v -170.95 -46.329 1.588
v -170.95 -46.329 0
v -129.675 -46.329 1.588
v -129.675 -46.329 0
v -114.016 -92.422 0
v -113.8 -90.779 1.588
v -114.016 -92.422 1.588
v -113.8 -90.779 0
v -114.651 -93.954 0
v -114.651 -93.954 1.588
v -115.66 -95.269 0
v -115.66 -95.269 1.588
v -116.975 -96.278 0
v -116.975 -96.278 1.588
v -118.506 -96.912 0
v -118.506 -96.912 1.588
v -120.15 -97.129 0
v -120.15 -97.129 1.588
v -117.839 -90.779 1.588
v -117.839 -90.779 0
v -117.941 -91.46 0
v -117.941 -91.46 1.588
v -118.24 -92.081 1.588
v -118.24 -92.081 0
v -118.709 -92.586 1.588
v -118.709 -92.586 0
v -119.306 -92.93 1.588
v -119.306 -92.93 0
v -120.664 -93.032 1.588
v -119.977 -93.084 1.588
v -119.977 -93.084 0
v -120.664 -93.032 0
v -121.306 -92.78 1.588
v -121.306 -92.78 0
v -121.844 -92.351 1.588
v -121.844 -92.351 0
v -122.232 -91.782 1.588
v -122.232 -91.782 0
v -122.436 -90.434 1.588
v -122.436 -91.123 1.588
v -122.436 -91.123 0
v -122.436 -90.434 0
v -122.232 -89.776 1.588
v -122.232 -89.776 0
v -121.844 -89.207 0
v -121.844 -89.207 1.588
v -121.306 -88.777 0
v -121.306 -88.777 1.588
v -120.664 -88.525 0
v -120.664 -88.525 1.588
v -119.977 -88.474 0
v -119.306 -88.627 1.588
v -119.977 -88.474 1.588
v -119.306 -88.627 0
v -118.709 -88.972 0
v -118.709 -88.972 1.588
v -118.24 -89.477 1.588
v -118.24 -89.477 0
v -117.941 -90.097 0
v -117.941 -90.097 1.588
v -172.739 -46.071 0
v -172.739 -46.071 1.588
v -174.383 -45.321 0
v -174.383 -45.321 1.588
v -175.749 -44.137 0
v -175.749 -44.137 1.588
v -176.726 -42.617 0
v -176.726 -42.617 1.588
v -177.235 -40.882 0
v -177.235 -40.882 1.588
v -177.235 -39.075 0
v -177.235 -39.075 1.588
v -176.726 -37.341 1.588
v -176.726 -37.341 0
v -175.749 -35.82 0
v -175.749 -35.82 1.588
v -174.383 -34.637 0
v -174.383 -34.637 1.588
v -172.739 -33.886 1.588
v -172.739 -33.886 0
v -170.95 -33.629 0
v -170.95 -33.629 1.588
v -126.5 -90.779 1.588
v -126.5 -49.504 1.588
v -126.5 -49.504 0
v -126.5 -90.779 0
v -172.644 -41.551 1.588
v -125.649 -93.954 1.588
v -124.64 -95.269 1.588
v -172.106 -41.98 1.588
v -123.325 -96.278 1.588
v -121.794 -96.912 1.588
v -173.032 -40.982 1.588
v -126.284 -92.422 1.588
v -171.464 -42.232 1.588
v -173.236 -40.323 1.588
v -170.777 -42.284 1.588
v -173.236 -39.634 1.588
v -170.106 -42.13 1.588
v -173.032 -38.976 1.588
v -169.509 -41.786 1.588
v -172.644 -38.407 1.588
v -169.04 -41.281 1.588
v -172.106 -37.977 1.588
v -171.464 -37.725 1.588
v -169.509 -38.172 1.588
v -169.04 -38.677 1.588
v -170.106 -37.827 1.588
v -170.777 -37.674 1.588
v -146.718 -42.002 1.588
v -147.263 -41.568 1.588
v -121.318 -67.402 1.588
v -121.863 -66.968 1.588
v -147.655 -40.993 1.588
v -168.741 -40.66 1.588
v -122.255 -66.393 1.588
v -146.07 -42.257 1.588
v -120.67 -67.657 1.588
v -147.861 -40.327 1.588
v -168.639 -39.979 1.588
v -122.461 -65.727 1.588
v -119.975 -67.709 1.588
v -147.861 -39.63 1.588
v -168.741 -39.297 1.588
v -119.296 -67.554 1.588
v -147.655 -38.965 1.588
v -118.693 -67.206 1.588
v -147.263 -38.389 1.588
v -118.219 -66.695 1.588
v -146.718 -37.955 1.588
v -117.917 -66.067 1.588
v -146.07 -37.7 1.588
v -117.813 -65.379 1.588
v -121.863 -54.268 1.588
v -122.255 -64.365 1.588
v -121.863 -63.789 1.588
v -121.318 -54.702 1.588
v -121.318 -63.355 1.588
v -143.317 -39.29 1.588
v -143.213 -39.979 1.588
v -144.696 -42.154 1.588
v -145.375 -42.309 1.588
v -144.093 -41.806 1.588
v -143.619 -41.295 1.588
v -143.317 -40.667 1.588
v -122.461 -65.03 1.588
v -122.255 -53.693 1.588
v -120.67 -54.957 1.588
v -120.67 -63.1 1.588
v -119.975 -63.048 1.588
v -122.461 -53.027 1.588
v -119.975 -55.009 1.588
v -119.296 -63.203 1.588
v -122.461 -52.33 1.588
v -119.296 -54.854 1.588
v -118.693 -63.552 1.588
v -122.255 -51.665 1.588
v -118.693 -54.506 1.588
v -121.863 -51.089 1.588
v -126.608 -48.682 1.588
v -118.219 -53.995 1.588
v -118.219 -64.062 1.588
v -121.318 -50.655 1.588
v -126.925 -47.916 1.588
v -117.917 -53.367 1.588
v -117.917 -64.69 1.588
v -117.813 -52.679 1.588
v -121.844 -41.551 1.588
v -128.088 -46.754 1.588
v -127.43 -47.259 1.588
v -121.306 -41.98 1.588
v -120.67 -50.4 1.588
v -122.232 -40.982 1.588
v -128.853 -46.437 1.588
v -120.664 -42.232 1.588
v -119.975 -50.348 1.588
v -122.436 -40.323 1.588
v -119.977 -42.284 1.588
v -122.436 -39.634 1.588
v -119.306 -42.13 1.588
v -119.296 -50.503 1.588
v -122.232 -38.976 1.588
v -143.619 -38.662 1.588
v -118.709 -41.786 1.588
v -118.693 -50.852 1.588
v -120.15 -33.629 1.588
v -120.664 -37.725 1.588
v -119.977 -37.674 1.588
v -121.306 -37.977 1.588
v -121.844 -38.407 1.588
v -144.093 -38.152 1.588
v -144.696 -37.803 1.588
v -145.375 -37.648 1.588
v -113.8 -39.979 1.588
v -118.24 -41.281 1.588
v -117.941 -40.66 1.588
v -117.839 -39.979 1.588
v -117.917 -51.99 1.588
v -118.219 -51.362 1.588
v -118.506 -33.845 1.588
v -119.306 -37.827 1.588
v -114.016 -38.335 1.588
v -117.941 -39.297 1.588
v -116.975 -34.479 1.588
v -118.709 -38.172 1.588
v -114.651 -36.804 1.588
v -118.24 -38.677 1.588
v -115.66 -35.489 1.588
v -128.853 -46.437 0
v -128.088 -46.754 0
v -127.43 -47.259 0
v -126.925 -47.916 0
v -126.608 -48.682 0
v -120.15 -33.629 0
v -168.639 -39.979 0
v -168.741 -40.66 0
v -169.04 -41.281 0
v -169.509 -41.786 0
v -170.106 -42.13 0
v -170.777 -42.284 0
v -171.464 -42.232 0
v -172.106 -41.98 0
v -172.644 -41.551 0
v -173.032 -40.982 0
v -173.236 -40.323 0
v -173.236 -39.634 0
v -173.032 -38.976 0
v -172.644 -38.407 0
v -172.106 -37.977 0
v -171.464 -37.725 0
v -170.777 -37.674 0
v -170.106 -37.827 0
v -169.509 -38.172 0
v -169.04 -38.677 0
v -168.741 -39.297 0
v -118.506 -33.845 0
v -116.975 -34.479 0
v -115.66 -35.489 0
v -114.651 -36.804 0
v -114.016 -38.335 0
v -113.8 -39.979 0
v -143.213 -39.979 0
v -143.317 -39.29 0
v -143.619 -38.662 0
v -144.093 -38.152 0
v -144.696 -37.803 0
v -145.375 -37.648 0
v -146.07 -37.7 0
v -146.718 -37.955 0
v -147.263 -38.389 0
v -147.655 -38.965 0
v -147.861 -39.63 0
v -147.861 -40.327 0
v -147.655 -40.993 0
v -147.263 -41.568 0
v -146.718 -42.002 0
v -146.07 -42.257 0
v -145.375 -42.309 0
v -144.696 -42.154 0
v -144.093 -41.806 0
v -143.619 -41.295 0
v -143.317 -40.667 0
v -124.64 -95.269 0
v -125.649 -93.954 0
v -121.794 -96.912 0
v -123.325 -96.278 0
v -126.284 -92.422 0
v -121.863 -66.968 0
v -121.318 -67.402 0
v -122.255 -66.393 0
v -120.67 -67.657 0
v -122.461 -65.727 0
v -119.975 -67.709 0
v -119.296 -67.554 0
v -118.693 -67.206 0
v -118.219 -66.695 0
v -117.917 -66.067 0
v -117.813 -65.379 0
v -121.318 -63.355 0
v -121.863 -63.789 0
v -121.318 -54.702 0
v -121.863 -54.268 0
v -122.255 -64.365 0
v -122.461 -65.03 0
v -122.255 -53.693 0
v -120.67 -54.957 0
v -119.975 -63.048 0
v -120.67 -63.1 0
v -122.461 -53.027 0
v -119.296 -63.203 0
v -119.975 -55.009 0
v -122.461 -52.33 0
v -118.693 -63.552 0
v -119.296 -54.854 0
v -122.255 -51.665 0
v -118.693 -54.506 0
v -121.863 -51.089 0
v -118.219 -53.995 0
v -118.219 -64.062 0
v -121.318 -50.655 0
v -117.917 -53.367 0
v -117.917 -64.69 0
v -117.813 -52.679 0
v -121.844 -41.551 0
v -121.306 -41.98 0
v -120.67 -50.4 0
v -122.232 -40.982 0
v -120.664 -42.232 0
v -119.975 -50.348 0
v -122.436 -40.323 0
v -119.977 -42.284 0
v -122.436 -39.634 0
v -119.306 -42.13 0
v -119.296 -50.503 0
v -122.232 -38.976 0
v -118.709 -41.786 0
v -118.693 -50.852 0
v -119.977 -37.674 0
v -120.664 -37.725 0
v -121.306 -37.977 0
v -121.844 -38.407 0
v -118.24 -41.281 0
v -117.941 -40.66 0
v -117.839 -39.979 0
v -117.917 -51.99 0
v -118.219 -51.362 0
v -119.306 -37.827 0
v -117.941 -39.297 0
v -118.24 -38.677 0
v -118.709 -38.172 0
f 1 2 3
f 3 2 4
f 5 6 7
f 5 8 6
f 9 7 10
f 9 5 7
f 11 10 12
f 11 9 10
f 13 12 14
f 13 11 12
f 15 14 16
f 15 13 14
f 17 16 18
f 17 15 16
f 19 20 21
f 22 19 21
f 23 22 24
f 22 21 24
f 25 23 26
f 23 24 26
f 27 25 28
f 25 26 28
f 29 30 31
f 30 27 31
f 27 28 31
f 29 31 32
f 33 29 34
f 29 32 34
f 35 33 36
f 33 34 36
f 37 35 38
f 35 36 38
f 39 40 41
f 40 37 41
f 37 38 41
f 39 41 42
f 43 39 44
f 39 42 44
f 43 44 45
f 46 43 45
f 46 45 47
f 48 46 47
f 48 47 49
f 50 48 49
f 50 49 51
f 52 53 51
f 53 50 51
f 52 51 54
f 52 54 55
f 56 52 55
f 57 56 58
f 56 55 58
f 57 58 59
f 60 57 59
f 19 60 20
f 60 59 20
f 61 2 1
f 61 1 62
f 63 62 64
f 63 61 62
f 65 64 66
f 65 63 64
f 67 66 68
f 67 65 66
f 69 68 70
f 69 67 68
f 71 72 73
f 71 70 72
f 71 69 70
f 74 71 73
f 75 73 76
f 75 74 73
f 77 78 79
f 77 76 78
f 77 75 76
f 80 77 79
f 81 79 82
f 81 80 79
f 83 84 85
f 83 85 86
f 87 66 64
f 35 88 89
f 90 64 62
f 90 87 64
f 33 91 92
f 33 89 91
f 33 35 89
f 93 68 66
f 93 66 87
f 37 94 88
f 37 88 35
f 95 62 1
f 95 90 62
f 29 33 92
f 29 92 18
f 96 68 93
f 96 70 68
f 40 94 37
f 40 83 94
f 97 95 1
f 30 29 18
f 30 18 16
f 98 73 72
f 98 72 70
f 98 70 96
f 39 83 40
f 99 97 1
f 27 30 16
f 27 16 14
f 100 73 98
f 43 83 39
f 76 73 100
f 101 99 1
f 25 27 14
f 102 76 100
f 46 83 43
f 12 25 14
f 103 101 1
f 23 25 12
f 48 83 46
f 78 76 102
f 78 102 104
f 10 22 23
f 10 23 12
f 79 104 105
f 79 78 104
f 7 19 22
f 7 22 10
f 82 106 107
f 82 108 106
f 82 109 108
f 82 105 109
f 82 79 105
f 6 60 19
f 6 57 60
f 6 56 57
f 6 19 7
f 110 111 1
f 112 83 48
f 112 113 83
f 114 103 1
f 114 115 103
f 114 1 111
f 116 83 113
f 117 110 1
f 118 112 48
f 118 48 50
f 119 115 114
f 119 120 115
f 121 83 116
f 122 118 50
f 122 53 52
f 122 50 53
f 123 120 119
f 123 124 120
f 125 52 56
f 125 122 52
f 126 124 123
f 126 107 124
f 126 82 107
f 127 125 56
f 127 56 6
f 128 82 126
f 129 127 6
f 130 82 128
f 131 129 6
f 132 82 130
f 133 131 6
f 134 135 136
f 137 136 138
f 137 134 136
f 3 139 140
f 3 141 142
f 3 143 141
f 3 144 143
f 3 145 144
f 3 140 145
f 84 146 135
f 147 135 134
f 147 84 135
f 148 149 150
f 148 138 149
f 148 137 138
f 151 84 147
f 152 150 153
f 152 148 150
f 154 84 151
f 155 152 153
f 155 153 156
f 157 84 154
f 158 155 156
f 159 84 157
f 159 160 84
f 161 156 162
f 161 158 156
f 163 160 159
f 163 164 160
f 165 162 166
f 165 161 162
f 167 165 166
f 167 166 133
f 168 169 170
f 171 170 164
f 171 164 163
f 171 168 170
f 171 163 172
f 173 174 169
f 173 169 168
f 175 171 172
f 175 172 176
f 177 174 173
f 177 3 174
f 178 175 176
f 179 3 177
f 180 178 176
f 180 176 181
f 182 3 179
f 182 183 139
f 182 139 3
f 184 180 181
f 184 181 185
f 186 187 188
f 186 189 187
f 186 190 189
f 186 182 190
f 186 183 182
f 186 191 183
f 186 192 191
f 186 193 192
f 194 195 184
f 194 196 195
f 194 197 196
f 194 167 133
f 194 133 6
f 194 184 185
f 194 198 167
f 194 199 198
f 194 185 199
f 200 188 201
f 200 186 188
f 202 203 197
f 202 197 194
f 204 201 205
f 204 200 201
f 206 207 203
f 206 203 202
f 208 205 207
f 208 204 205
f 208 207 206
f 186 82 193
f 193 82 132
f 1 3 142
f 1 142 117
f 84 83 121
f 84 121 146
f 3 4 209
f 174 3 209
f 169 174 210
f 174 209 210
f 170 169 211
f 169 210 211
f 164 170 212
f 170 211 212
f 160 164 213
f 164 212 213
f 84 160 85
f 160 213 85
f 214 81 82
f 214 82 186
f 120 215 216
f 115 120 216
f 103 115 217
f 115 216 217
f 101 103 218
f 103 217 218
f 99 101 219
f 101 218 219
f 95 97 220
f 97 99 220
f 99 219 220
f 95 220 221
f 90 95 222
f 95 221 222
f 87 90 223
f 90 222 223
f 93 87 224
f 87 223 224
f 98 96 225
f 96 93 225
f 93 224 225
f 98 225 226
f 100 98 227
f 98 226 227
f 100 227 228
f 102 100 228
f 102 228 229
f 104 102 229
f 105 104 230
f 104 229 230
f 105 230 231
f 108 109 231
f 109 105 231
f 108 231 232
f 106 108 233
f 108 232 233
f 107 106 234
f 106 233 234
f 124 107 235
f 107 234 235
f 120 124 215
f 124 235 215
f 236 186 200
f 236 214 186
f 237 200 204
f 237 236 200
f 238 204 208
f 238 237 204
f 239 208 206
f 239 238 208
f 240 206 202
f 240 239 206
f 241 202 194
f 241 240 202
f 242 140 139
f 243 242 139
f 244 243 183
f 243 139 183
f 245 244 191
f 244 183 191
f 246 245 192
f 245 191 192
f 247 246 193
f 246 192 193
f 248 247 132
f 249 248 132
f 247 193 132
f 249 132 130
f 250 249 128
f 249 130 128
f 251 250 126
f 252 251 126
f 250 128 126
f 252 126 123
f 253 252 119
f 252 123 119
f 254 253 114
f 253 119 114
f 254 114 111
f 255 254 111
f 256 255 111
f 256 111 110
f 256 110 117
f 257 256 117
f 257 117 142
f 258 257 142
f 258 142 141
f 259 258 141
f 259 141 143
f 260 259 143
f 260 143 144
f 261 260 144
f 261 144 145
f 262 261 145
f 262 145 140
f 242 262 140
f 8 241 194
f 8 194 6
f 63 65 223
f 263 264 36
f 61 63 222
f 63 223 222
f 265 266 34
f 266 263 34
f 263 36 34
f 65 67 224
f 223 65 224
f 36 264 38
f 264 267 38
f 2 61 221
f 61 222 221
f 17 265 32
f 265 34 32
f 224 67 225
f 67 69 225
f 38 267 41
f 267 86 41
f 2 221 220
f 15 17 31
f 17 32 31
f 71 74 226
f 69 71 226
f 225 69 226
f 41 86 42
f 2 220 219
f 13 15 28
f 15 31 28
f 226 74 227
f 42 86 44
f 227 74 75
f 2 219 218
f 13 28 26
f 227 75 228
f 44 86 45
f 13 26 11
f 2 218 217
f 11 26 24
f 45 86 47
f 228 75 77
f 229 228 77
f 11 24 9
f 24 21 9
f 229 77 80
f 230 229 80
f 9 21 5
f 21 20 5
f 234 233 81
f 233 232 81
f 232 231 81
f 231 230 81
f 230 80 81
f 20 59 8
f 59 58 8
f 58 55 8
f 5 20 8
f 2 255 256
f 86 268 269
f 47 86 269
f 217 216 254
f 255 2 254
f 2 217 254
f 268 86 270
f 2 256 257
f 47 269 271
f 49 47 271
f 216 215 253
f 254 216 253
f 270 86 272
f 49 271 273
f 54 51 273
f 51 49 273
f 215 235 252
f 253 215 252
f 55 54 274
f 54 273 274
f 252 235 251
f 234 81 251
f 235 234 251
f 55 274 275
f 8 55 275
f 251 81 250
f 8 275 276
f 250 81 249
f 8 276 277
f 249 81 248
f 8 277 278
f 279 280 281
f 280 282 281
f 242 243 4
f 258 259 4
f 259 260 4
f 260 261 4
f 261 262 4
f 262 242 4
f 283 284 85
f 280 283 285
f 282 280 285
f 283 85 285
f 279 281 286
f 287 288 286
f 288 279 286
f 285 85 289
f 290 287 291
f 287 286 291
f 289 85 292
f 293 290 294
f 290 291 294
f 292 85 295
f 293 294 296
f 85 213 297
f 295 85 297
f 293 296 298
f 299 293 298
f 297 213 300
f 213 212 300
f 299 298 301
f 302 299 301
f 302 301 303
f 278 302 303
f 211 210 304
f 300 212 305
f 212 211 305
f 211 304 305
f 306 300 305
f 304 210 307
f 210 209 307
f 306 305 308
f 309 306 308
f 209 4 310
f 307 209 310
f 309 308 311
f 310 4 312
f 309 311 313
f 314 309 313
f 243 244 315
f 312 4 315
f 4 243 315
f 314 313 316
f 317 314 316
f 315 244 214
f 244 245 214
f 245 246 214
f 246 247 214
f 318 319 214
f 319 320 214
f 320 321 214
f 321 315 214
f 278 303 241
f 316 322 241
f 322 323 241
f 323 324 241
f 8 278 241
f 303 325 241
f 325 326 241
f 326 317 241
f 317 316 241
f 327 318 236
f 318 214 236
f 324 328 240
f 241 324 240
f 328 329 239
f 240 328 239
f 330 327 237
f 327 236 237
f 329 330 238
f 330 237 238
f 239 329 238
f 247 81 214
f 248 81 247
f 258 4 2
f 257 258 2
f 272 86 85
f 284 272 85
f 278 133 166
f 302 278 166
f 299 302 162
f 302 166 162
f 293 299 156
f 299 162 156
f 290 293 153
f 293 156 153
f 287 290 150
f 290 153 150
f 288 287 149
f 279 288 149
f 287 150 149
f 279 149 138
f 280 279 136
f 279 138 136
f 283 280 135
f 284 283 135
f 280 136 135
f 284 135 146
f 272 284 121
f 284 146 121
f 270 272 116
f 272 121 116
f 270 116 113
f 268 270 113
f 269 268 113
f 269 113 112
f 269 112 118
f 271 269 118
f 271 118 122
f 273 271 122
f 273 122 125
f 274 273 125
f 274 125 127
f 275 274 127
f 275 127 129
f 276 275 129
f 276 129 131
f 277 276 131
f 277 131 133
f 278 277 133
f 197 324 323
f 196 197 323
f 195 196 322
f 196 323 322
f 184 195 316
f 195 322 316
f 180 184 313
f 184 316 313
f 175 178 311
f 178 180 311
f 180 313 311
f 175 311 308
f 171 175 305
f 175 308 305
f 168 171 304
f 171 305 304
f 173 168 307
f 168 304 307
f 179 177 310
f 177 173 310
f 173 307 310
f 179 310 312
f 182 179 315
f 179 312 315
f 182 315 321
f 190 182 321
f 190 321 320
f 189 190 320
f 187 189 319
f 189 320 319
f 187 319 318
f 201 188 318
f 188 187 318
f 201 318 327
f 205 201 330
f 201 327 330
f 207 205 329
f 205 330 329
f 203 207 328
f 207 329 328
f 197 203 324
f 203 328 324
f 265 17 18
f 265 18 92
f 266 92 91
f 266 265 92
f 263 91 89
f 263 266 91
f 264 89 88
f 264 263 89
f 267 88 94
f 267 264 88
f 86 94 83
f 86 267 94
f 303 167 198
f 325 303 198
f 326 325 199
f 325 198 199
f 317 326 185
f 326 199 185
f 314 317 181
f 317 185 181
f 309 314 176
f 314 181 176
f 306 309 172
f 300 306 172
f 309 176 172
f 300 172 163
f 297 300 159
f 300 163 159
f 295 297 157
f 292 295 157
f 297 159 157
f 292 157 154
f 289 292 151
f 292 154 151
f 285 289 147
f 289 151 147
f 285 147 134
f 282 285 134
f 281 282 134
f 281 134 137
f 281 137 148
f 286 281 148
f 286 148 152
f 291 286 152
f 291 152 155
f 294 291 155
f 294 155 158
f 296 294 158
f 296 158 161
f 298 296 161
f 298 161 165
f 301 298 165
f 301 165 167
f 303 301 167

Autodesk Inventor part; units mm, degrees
ref_plane "YZ Plane" through (0, 0, 0) normal (1, 0, 0) x (0, 1, 0)
ref_plane "XZ Plane" through (0, 0, 0) normal (0, 1, 0) x (-1, 0, 0)
ref_plane "XY Plane" through (0, 0, 0) normal (0, 0, 1) x (1, 0, 0)
sketch "Sketch1" plane through (0, 0, 0) normal (0, 0, 1) x (1, 0, 0)
  line L0 (-127.5242, -32.3587) -> (-188.9758, -32.3587) projected
  line L1 (-128.9881, -97.1287) -> (-187.5119, -97.1287) projected
  line L2 (-113.8, -97.1287) -> (-113.8, -85.5717) projected
  circle A0 centre (-120.15, -39.9787) radius 2.3114 projected
  circle A1 centre (-120.15, -90.7787) radius 2.3114 projected
  circle A2 centre (-170.95, -90.7787) radius 2.3114 projected
  circle A3 centre (-170.95, -39.9787) radius 2.3114 projected
  circle A4 centre (-158.25, -39.9787) radius 2.3114 projected
  circle A5 centre (-158.25, -90.7787) radius 2.3114 projected
  circle A6 centre (-120.15, -39.9787) radius 6.35
  circle A7 centre (-170.95, -39.9787) radius 6.35
  circle A8 centre (-170.95, -90.7787) radius 6.35
  circle A9 centre (-120.15, -90.7787) radius 6.35
  line L3 (-170.95, -33.6287) -> (-120.15, -33.6287)
  line L4 (-113.8, -39.9787) -> (-113.8, -90.7787)
  line L5 (-120.15, -97.1287) -> (-170.95, -97.1287)
  line L6 (-170.95, -46.3287) -> (-129.675, -46.3287)
  line L7 (-126.5, -49.5037) -> (-126.5, -81.2537)
  line L8 (-129.675, -84.4287) -> (-170.95, -84.4287)
  arc A10 (-126.5, -49.5037) -> (-129.675, -46.3287) centre (-129.675, -49.5037) ccw
  arc A11 (-129.675, -84.4287) -> (-126.5, -81.2537) centre (-129.675, -81.2537) ccw
  circle A12 centre (-170.95, -39.9787) radius 2.3114
  circle A13 centre (-120.15, -39.9787) radius 2.3114
  circle A14 centre (-120.15, -90.7787) radius 2.3114
  circle A15 centre (-170.95, -90.7787) radius 2.3114
  circle A16 centre (-158.25, -90.7787) radius 2.3114
  circle A17 centre (-158.25, -39.9787) radius 2.3114
  point P0 (0, 0)
  dimension "d6" = 12.7
  dimension "d7" = 12.7
  dimension "d8" = 12.7
  dimension "d9" = 12.7
  dimension "d10" = 3.175
extrude "Extrusion1" add sketch "Sketch1" along normal blind 1.5875
sketch "Sketch2" plane through (0, 0, 1.5875) normal (0, 0, 1) x (1, 0, 0)
  circle A0 centre (-158.25, -39.9787) radius 2.3114 projected
  circle A1 centre (-158.25, -39.9787) radius 2.3114
  circle A2 centre (-158.25, -90.7787) radius 2.3114 projected
  circle A3 centre (-158.25, -90.7787) radius 2.3114
  circle A4 centre (-145.55, -90.7787) radius 2.3368
  circle A5 centre (-170.95, -90.7787) radius 2.3114 projected
  circle A6 centre (-145.55, -39.9787) radius 2.3368
  circle A7 centre (-120.15, -65.3787) radius 2.3368
  circle A8 centre (-120.15, -39.9787) radius 2.3114 projected
  line L0 (-113.8, -90.7787) -> (-113.8, -39.9787) projected
  circle A9 centre (-170.95, -39.9787) radius 2.3114 projected
  circle A10 centre (-120.15, -90.7787) radius 2.3114 projected
  point P0 (0, 0)
  dimension "d13" = 4.6736
  dimension "d14" = 25.4
  dimension "d15" = 4.6736
  dimension "d16" = 4.6736
  dimension "d17" = 25.4
  dimension "d18" = 6.35
  dimension "d23" = 25.4
  dimension "d24" = 25.4
  dimension "d25" = 25.4
extrude "Extrusion2" cut sketch "Sketch2" against normal blind 25.4 contours A4 | A6 | A7
extrude "Extrusion3" add sketch "Sketch2" against normal up to surface (1.5875 mm away) contours A0 | A2
sketch "Sketch3" plane through (0, 0, 1.5875) normal (0, 0, 1) x (1, 0, 0)
  line L0 (-126.5, -49.5037) -> (-126.5, -81.2537) projected
  line L1 (-126.5, -81.2537) -> (-126.5, -90.7787)
  line L2 (-170.95, -97.1287) -> (-120.15, -97.1287) projected
  circle A0 centre (-145.55, -90.7787) radius 2.3368 projected
  circle A1 centre (-145.55, -39.9787) radius 2.3368 projected
  circle A2 centre (-120.15, -65.3787) radius 2.3368 projected
  line L3 (-113.8, -90.7787) -> (-113.8, -39.9787) projected
  arc A3 (-113.8, -39.9787) -> (-120.15, -33.6287) centre (-120.15, -39.9787) ccw projected
  line L4 (-120.15, -33.6287) -> (-170.95, -33.6287) projected
  arc A4 (-170.95, -33.6287) -> (-170.95, -46.3287) centre (-170.95, -39.9787) ccw projected
  line L5 (-170.95, -46.3287) -> (-129.675, -46.3287) projected
  arc A5 (-126.5, -49.5037) -> (-129.675, -46.3287) centre (-129.675, -49.5037) ccw projected
  line L6 (-126.5, -49.5037) -> (-126.5, -81.2537) projected
  arc A6 (-129.675, -84.4287) -> (-126.5, -81.2537) centre (-129.675, -81.2537) ccw projected
  line L7 (-129.675, -84.4287) -> (-170.95, -84.4287) projected
  arc A7 (-170.95, -84.4287) -> (-170.95, -97.1287) centre (-170.95, -90.7787) ccw projected
  line L8 (-170.95, -97.1287) -> (-120.15, -97.1287) projected
  arc A8 (-120.15, -97.1287) -> (-113.8, -90.7787) centre (-120.15, -90.7787) ccw projected
  circle A9 centre (-170.95, -39.9787) radius 2.3114 projected
  circle A10 centre (-120.15, -39.9787) radius 2.3114 projected
  circle A11 centre (-170.95, -90.7787) radius 2.3114 projected
  circle A12 centre (-120.15, -90.7787) radius 2.3114 projected
  arc A13 (-120.15, -97.1287) -> (-113.8, -90.7787) centre (-120.15, -90.7787) ccw projected
  line L9 (-120.15, -97.1287) -> (-120.15, -97.1287)
  arc A14 (-126.5, -90.7787) -> (-120.15, -97.1287) centre (-120.15, -90.7787) ccw
  circle A15 centre (-120.15, -52.6787) radius 2.3368
  line L10 (-126.5, -79.1192) -> (-182.8014, -79.1192)
  line L11 (-182.8014, -79.1192) -> (-182.8014, -103.4813)
  line L12 (-182.8014, -103.4813) -> (-126.5, -103.4813)
  line L13 (-126.5, -103.4813) -> (-126.5, -79.1192)
  line L14 (-126.5, -97.1287) -> (-120.15, -97.1287)
  point P0 (0, 0)
  dimension "d26" = 6.35
  dimension "d27" = 4.6736
  dimension "d28" = 38.1
  dimension "d29" = 6.35
extrude "Cut1" cut sketch "Sketch3" against normal blind 1.5875 contours L0 A6 L7 A7 L2 L13 L12 L11 L10 | L1 L13 L2 A7 L7 A6
sketch "Sketch4" plane through (0, 0, 1.5875) normal (0, 0, 1) x (1, 0, 0)
  circle A0 centre (-120.15, -52.6787) radius 2.3368
  line L0 (-113.8, -90.7787) -> (-113.8, -39.9787) projected
  circle A1 centre (-120.15, -90.7787) radius 2.3114 projected
  point P0 (0, 0)
  dimension "d33" = 4.6736
  dimension "d34" = 6.35
  dimension "d35" = 38.1
extrude "Cut2" cut sketch "Sketch4" against normal blind 1.5875 contours A0
fillet "Corner Round1" radius 6.35 1 edges at (-126.5, -97.1287, 0.7937)
equation "\"d31\" = Thickness"
equation "\"d36\" = Thickness"
equation "\"BendRadius\" = Thickness"
equation "\"BendReliefWidth\" = Thickness"
equation "\"BendReliefDepth\" = 0.5 * Thickness"
equation "\"CornerReliefSize\" = 4 * Thickness"
equation "\"MinimumRemnant\" = 2 * Thickness"
equation "\"TransitionRadius\" = BendRadius"
equation "\"JacobiRadiusSize\" = BendRadius"
equation "\"GapSize\" = Thickness"
equation "\"d30\" = Thickness"
equation "\"Thickness\" = 1.5875"
properties part number "frontgusset" material "Polycarbonate, Clear"
